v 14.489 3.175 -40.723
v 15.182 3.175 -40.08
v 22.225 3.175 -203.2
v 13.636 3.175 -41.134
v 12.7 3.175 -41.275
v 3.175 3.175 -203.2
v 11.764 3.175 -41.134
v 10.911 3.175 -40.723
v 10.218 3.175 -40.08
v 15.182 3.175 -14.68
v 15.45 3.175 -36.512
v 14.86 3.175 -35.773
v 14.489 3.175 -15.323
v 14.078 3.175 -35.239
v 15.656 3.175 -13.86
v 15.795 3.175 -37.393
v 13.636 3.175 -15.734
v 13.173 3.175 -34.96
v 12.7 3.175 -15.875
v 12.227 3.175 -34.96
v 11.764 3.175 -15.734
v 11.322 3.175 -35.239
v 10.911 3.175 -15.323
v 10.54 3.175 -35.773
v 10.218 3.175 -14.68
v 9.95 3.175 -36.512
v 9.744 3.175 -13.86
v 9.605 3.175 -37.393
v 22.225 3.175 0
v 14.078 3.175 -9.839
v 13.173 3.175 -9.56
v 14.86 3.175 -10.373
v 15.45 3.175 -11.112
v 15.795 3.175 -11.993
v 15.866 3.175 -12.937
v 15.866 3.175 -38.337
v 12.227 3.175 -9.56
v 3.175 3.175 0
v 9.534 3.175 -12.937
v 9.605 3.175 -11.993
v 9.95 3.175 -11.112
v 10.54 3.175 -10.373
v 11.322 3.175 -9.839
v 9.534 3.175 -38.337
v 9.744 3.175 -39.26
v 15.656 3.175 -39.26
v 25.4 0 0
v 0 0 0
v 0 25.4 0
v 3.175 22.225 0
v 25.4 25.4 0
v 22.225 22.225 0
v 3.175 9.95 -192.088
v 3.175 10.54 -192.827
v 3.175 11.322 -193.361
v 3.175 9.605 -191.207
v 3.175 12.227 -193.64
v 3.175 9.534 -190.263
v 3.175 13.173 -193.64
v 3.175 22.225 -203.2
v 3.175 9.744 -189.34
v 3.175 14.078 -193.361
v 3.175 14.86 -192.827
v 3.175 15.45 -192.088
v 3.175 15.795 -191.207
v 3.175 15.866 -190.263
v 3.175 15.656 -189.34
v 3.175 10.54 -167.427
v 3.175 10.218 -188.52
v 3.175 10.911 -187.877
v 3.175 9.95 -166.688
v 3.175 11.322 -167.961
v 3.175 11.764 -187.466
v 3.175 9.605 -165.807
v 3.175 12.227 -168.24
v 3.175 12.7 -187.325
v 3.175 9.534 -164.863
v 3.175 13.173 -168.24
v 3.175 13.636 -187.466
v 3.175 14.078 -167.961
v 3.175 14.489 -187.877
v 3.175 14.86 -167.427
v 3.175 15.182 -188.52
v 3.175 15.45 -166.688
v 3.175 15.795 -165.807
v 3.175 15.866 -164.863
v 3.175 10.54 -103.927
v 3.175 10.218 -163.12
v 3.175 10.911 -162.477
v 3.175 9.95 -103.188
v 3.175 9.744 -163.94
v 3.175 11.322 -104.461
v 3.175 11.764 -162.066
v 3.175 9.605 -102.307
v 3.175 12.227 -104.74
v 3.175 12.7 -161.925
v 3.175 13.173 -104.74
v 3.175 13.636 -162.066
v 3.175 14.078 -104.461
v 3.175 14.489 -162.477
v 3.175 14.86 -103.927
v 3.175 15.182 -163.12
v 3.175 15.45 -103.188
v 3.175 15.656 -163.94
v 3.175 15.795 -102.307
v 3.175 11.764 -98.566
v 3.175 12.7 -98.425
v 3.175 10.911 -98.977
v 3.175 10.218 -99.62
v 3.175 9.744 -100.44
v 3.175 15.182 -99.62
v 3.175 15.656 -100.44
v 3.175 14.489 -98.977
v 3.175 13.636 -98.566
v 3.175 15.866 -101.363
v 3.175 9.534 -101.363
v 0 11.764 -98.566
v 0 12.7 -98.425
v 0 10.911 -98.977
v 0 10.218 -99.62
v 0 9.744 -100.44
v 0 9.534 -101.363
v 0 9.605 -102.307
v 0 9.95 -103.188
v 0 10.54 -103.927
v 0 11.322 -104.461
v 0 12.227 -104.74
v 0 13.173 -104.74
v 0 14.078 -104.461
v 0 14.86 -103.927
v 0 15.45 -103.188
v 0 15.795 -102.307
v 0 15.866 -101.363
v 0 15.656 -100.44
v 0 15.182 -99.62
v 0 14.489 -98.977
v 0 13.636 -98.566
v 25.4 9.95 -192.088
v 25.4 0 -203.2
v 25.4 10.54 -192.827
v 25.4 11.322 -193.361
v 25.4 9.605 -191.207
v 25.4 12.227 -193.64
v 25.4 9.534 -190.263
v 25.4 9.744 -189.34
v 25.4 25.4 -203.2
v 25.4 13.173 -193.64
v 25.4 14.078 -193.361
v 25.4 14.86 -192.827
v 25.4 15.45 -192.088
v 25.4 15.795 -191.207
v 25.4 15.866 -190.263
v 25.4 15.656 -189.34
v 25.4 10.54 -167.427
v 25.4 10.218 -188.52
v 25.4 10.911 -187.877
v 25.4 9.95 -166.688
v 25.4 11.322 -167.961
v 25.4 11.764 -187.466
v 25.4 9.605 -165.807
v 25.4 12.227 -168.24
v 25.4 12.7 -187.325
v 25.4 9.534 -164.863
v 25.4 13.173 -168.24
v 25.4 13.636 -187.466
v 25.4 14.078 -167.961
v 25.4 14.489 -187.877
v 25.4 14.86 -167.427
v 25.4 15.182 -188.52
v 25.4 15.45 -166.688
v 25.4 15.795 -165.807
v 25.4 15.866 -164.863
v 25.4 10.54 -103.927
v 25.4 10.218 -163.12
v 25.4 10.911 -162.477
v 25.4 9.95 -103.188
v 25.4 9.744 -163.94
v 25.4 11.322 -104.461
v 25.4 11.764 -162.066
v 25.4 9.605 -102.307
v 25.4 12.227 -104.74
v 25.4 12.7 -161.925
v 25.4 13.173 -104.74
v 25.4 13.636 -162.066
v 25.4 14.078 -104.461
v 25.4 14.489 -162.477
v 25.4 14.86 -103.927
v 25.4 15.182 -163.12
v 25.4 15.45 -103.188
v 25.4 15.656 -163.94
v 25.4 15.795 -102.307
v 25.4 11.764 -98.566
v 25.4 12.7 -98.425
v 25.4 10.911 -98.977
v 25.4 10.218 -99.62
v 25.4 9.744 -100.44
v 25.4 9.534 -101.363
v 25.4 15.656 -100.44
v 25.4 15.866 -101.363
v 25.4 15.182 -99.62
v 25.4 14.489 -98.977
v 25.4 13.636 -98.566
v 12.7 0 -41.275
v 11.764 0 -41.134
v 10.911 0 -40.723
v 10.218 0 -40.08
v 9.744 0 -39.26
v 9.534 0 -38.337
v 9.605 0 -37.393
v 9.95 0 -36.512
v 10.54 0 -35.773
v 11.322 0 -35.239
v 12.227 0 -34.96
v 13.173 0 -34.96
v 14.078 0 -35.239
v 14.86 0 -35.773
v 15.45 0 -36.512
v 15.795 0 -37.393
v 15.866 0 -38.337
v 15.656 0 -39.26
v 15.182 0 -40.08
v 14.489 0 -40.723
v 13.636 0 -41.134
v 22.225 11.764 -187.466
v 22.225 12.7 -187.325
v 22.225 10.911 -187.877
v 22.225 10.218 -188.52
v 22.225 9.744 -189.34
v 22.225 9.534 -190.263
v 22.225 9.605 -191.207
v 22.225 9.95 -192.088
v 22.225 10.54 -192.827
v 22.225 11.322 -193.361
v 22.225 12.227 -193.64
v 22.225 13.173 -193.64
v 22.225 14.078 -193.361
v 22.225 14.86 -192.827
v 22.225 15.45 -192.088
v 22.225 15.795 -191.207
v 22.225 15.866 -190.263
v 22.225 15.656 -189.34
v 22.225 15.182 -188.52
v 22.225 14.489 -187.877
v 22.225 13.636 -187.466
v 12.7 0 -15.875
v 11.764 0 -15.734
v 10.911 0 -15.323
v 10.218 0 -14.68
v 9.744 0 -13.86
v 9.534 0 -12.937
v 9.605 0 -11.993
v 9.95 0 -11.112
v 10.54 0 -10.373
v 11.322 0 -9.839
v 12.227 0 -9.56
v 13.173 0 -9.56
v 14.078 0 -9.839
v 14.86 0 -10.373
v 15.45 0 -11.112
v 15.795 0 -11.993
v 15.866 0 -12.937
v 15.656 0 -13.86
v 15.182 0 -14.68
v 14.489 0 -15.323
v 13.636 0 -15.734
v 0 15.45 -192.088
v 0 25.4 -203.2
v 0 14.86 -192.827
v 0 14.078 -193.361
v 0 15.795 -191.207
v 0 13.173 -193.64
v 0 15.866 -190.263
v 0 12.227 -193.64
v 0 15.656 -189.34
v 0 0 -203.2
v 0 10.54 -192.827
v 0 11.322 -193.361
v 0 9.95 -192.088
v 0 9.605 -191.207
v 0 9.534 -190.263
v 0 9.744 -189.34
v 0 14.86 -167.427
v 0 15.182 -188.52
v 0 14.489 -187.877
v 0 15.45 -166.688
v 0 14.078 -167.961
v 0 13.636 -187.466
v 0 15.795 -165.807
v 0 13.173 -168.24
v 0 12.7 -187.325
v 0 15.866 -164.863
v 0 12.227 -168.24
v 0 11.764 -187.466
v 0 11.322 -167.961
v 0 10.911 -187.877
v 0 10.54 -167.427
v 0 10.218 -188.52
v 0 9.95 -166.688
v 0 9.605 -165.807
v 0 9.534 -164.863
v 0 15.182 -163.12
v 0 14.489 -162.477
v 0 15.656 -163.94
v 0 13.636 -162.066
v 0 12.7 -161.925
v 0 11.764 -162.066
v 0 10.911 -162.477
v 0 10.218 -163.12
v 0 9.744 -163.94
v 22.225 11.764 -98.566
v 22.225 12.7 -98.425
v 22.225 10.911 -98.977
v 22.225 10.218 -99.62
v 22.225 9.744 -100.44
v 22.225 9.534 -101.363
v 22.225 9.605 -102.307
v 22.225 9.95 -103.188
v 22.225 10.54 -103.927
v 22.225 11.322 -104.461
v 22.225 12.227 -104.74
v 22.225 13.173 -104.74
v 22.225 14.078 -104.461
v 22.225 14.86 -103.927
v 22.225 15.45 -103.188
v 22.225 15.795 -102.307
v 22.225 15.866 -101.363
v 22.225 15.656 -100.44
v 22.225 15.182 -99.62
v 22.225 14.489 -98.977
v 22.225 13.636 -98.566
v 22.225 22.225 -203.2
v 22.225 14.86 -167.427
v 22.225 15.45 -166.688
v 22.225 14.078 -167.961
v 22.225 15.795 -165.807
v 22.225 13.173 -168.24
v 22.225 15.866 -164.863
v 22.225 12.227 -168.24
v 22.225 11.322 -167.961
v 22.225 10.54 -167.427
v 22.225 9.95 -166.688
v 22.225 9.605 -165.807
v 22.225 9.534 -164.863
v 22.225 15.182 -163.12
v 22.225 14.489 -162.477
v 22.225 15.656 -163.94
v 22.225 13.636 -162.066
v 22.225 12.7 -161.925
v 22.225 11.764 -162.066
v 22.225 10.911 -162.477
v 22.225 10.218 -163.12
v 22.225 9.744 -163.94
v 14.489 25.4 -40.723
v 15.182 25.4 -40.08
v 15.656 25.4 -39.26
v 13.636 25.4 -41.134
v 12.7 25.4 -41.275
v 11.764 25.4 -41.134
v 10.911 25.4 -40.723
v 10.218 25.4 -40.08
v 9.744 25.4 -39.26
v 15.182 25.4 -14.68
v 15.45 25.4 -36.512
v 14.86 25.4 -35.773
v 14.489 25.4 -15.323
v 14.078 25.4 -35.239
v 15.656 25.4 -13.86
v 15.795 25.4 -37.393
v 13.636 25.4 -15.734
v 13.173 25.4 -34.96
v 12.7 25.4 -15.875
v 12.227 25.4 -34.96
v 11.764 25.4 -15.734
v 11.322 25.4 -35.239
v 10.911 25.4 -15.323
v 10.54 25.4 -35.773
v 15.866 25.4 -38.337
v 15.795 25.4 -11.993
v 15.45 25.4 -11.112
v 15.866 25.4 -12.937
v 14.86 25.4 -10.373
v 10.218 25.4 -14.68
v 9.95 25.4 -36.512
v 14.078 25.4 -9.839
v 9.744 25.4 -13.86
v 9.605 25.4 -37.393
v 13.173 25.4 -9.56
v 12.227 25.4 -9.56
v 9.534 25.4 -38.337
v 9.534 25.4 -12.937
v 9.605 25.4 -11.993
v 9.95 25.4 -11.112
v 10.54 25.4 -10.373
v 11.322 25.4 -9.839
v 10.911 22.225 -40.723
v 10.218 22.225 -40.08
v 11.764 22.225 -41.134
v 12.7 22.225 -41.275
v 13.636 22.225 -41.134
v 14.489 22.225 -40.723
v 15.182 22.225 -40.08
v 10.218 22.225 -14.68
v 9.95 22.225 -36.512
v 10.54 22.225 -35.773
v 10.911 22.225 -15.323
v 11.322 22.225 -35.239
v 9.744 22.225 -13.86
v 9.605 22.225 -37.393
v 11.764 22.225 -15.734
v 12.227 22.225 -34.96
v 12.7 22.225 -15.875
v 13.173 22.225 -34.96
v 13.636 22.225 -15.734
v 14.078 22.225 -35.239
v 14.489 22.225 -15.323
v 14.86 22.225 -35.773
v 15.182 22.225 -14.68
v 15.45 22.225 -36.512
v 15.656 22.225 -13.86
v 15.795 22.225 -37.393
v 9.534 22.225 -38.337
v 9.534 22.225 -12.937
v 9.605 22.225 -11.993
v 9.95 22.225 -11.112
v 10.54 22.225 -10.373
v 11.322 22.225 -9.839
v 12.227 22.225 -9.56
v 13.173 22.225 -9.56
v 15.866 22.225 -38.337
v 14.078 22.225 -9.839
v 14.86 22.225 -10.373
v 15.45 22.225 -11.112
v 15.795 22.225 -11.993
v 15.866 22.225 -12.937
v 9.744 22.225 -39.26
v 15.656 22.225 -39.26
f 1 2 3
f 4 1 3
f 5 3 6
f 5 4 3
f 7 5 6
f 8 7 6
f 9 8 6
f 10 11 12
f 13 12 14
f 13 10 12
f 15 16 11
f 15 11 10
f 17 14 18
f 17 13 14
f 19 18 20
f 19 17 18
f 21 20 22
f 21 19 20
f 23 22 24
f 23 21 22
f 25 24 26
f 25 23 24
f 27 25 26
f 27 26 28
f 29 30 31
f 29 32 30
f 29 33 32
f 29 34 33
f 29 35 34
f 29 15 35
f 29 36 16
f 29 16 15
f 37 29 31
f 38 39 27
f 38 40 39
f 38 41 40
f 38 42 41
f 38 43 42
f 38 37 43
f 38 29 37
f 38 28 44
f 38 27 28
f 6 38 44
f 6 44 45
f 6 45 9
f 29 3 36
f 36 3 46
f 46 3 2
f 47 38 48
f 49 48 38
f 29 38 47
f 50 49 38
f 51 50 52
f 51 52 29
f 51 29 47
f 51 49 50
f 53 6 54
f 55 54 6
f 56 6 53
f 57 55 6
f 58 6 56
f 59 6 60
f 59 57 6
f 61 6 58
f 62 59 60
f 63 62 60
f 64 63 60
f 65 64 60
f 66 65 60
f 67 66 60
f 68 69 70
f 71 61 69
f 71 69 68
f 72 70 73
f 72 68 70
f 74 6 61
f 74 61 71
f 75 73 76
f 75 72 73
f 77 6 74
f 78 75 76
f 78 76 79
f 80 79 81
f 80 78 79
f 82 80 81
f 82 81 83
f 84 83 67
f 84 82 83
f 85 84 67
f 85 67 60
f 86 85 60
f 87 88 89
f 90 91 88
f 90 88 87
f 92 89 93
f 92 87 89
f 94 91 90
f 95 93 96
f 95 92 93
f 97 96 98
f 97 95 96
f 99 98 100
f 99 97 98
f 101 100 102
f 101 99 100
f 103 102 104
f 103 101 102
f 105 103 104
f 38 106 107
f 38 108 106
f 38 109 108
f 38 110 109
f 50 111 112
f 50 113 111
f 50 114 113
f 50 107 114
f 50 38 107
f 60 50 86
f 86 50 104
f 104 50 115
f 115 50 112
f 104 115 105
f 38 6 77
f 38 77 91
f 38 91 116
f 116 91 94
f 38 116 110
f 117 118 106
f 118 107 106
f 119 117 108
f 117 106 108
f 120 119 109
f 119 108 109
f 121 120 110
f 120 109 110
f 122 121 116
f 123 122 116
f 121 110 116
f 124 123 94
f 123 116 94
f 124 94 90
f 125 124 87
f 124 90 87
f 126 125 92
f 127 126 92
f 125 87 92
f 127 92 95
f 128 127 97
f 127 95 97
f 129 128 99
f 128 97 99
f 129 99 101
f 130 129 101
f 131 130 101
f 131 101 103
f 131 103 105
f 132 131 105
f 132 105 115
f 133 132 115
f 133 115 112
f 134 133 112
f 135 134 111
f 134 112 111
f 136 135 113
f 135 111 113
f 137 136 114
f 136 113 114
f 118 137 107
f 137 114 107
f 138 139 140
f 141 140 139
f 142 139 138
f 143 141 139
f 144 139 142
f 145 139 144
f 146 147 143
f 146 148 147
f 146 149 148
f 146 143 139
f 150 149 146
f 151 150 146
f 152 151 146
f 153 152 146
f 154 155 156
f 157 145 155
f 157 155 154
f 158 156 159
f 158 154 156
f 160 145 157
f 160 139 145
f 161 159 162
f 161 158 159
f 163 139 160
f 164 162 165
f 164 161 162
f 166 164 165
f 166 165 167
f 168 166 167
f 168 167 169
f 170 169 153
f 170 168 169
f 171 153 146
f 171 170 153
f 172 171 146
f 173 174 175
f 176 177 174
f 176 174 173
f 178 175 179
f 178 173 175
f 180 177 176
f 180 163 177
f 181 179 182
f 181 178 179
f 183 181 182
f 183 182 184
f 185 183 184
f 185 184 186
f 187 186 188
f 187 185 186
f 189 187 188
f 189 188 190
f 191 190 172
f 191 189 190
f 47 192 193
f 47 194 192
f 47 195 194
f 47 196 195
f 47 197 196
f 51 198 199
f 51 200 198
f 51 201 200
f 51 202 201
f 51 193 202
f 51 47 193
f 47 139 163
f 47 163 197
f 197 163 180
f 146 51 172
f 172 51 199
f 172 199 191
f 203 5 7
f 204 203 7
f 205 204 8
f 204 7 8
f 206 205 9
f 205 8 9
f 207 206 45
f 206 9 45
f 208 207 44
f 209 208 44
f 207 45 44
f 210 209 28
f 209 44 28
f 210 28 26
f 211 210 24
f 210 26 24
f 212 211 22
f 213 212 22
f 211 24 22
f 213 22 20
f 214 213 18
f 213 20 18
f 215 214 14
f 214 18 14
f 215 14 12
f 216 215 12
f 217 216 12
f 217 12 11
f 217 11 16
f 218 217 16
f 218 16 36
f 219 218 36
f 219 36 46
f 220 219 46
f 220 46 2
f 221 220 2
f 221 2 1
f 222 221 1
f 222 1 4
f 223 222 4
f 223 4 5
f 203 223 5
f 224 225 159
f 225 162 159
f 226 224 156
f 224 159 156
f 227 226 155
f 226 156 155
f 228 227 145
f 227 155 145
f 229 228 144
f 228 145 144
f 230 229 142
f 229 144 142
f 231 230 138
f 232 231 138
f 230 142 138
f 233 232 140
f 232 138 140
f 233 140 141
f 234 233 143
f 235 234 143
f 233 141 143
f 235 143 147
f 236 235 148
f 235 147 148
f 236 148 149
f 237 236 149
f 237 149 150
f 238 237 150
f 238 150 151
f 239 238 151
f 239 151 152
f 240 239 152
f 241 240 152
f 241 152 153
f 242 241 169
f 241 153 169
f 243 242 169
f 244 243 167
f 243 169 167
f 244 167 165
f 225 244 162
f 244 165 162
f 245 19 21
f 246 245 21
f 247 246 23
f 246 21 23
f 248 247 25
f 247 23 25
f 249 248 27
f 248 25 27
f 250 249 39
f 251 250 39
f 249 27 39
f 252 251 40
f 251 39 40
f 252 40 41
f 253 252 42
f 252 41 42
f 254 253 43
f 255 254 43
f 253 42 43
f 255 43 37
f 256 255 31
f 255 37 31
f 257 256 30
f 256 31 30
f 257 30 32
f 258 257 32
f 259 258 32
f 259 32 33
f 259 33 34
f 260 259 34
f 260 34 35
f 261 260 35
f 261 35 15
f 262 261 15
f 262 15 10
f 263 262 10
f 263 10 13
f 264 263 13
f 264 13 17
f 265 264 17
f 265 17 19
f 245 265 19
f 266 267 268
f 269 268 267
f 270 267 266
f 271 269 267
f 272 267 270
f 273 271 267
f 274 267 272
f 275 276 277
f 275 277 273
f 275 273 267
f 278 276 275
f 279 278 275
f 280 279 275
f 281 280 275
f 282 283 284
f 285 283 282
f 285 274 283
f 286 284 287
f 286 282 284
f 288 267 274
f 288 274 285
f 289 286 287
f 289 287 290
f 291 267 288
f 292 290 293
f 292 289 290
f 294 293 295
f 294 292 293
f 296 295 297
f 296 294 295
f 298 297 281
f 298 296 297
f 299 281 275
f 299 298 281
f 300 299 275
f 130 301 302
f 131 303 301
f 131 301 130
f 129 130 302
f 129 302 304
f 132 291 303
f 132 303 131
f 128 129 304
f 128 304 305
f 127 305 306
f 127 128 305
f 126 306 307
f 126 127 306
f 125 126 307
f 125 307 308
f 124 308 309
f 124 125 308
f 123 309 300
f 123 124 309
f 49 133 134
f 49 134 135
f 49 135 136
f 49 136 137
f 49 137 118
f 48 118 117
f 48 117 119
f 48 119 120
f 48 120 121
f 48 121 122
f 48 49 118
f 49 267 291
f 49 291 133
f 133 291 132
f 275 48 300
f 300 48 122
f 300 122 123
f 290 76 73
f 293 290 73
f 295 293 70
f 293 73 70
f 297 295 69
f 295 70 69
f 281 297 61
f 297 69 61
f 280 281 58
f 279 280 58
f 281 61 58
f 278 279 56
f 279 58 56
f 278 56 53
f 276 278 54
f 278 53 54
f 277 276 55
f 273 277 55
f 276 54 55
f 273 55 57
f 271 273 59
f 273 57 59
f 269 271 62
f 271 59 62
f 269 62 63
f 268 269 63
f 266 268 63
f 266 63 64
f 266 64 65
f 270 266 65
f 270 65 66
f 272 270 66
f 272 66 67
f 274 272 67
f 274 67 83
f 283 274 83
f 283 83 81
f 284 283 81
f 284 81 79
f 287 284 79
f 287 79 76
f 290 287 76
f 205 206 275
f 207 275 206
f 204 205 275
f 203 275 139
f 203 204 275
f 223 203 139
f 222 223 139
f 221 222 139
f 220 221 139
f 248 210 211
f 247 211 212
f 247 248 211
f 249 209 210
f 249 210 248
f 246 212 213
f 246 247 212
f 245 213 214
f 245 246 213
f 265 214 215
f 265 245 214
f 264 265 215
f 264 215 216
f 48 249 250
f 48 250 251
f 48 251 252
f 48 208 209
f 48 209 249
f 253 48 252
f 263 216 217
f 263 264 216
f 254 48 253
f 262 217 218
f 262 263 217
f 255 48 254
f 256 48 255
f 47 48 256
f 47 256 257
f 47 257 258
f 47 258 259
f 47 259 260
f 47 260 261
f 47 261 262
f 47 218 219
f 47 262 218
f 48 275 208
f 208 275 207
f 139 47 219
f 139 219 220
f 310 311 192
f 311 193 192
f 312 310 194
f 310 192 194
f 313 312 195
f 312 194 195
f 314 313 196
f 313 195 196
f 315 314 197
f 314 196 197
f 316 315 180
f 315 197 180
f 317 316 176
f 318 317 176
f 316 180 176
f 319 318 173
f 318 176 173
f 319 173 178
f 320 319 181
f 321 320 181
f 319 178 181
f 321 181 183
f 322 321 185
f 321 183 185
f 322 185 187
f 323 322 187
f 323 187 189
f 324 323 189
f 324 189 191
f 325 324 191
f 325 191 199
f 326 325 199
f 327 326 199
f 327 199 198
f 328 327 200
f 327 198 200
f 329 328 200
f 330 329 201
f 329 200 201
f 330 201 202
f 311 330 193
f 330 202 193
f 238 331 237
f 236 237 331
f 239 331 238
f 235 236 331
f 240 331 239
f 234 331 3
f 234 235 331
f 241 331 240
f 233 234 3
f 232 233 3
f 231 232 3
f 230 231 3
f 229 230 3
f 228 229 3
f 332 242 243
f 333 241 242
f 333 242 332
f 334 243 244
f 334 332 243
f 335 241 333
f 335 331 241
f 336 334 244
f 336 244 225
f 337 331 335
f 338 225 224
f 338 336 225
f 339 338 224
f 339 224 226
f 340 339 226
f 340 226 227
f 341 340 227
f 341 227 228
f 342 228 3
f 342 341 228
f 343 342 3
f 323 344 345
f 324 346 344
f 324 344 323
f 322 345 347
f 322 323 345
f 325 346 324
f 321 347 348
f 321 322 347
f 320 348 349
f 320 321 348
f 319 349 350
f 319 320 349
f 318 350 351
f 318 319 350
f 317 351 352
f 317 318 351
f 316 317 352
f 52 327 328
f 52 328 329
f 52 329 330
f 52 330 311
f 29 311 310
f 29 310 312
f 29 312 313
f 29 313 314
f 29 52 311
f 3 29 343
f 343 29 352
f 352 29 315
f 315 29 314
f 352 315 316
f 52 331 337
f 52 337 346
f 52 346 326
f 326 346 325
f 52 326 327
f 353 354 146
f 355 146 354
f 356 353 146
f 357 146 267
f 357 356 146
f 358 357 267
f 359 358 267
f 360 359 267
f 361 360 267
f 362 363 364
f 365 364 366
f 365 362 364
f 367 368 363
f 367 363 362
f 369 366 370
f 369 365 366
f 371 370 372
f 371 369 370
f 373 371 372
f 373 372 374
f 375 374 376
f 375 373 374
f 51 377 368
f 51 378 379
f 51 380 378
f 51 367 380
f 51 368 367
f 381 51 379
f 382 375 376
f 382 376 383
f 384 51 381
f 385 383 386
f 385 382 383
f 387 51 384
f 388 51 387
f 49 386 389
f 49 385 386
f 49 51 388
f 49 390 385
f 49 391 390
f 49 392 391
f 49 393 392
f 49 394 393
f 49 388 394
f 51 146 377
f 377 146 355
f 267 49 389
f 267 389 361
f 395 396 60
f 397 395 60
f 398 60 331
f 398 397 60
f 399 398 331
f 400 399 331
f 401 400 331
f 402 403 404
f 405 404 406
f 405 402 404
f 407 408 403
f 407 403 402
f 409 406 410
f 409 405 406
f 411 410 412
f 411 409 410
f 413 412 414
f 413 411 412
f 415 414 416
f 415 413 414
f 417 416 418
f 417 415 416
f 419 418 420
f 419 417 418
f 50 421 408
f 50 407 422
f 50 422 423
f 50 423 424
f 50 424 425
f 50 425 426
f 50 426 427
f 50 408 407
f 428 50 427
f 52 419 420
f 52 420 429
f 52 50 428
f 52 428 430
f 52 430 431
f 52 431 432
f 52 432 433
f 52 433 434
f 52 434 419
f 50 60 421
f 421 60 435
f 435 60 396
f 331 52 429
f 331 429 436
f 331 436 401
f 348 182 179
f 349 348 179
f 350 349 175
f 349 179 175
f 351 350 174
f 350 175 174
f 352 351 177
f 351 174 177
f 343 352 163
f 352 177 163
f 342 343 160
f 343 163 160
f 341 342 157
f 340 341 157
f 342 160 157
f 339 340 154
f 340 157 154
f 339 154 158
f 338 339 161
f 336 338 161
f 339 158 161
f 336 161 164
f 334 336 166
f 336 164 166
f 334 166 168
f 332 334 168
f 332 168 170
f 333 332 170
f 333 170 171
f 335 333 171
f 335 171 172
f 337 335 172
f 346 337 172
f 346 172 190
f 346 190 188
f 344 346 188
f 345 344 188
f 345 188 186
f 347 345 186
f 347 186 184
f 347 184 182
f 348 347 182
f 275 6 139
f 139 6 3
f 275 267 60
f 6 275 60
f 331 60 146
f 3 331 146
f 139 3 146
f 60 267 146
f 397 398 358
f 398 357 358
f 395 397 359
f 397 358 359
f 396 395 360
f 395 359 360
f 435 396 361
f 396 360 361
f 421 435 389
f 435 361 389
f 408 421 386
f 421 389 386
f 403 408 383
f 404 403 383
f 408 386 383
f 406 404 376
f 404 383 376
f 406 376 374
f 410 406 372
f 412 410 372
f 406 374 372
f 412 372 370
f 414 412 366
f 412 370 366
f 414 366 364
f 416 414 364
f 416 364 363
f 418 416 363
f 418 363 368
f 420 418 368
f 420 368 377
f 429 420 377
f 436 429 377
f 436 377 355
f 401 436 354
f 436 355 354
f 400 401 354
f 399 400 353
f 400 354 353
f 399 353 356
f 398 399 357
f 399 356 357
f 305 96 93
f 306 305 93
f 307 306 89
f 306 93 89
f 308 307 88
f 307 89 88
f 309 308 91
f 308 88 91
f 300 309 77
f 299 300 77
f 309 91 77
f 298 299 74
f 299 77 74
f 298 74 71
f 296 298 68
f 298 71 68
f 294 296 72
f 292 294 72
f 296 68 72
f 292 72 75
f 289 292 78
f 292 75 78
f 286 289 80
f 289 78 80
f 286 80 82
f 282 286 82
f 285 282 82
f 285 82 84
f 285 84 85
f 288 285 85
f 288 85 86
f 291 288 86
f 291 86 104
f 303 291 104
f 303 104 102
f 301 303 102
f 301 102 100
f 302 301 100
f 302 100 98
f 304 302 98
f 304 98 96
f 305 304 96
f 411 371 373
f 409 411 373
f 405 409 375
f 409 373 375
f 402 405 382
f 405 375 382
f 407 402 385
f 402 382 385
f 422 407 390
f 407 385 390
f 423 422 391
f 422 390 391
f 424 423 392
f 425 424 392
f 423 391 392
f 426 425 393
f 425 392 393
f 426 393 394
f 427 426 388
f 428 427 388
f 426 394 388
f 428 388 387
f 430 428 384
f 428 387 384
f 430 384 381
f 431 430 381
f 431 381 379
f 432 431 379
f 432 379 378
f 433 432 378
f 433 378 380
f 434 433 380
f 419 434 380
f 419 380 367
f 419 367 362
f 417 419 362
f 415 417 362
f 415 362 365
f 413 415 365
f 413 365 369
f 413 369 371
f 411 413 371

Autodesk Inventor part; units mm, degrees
ref_plane "YZ Plane" through (0, 0, 0) normal (1, 0, 0) x (0, 1, 0)
ref_plane "XZ Plane" through (0, 0, 0) normal (0, 1, 0) x (-1, 0, 0)
ref_plane "XY Plane" through (0, 0, 0) normal (0, 0, 1) x (1, 0, 0)
sketch "Sketch1" plane through (0, 0, 0) normal (0, 0, 1) x (1, 0, 0)
  line L0 (0, 0) -> (25.4, 0)
  line L1 (25.4, 0) -> (25.4, 25.4)
  line L2 (25.4, 25.4) -> (0, 25.4)
  line L3 (0, 25.4) -> (0, 0)
  line L4 (3.175, 22.225) -> (22.225, 22.225)
  line L5 (22.225, 22.225) -> (22.225, 3.175)
  line L6 (22.225, 3.175) -> (3.175, 3.175)
  line L7 (3.175, 3.175) -> (3.175, 22.225)
  dimension "d0" = 25.4
  dimension "d1" = 25.4
  dimension "d2" = 3.175
extrude "Extrusion1" add sketch "Sketch1" against normal blind 203.2
sketch "Sketch2" plane through (0, 0, 0) normal (-1, 0, 0) x (0, 0, 1)
  line L0 (-203.2, 25.4) -> (-203.2, 0) projected
  line L1 (0, 25.4) -> (-203.2, 25.4) projected
  point P0 (-190.5, 12.7)
  point P1 (-165.1, 12.7)
  point P2 (-101.6, 12.7)
  dimension "d5" = 12.7
  dimension "d6" = 25.4
  dimension "d7" = 12.7
hole "Hole1" at (0, 12.7, -190.5) at (0, 12.7, -165.1) at (0, 12.7, -101.6) direction (1, 0, 0) diameter 6.35 depth 25.4 tip angle 118
sketch "Sketch3" plane through (0, 0, 0) normal (0, -1, 0) x (1, 0, 0)
  line L0 (0, 0) -> (25.4, 0) projected
  point P0 (12.7, -12.7)
  point P1 (12.7, -38.1)
  dimension "d15" = 25.4
  dimension "d16" = 12.7
hole "Hole2" at (12.7, 0, -12.7) at (12.7, 0, -38.1) direction (0, 1, 0) diameter 6.35 depth 25.4 tip angle 118
properties part number "towermiddle8inbrace"
